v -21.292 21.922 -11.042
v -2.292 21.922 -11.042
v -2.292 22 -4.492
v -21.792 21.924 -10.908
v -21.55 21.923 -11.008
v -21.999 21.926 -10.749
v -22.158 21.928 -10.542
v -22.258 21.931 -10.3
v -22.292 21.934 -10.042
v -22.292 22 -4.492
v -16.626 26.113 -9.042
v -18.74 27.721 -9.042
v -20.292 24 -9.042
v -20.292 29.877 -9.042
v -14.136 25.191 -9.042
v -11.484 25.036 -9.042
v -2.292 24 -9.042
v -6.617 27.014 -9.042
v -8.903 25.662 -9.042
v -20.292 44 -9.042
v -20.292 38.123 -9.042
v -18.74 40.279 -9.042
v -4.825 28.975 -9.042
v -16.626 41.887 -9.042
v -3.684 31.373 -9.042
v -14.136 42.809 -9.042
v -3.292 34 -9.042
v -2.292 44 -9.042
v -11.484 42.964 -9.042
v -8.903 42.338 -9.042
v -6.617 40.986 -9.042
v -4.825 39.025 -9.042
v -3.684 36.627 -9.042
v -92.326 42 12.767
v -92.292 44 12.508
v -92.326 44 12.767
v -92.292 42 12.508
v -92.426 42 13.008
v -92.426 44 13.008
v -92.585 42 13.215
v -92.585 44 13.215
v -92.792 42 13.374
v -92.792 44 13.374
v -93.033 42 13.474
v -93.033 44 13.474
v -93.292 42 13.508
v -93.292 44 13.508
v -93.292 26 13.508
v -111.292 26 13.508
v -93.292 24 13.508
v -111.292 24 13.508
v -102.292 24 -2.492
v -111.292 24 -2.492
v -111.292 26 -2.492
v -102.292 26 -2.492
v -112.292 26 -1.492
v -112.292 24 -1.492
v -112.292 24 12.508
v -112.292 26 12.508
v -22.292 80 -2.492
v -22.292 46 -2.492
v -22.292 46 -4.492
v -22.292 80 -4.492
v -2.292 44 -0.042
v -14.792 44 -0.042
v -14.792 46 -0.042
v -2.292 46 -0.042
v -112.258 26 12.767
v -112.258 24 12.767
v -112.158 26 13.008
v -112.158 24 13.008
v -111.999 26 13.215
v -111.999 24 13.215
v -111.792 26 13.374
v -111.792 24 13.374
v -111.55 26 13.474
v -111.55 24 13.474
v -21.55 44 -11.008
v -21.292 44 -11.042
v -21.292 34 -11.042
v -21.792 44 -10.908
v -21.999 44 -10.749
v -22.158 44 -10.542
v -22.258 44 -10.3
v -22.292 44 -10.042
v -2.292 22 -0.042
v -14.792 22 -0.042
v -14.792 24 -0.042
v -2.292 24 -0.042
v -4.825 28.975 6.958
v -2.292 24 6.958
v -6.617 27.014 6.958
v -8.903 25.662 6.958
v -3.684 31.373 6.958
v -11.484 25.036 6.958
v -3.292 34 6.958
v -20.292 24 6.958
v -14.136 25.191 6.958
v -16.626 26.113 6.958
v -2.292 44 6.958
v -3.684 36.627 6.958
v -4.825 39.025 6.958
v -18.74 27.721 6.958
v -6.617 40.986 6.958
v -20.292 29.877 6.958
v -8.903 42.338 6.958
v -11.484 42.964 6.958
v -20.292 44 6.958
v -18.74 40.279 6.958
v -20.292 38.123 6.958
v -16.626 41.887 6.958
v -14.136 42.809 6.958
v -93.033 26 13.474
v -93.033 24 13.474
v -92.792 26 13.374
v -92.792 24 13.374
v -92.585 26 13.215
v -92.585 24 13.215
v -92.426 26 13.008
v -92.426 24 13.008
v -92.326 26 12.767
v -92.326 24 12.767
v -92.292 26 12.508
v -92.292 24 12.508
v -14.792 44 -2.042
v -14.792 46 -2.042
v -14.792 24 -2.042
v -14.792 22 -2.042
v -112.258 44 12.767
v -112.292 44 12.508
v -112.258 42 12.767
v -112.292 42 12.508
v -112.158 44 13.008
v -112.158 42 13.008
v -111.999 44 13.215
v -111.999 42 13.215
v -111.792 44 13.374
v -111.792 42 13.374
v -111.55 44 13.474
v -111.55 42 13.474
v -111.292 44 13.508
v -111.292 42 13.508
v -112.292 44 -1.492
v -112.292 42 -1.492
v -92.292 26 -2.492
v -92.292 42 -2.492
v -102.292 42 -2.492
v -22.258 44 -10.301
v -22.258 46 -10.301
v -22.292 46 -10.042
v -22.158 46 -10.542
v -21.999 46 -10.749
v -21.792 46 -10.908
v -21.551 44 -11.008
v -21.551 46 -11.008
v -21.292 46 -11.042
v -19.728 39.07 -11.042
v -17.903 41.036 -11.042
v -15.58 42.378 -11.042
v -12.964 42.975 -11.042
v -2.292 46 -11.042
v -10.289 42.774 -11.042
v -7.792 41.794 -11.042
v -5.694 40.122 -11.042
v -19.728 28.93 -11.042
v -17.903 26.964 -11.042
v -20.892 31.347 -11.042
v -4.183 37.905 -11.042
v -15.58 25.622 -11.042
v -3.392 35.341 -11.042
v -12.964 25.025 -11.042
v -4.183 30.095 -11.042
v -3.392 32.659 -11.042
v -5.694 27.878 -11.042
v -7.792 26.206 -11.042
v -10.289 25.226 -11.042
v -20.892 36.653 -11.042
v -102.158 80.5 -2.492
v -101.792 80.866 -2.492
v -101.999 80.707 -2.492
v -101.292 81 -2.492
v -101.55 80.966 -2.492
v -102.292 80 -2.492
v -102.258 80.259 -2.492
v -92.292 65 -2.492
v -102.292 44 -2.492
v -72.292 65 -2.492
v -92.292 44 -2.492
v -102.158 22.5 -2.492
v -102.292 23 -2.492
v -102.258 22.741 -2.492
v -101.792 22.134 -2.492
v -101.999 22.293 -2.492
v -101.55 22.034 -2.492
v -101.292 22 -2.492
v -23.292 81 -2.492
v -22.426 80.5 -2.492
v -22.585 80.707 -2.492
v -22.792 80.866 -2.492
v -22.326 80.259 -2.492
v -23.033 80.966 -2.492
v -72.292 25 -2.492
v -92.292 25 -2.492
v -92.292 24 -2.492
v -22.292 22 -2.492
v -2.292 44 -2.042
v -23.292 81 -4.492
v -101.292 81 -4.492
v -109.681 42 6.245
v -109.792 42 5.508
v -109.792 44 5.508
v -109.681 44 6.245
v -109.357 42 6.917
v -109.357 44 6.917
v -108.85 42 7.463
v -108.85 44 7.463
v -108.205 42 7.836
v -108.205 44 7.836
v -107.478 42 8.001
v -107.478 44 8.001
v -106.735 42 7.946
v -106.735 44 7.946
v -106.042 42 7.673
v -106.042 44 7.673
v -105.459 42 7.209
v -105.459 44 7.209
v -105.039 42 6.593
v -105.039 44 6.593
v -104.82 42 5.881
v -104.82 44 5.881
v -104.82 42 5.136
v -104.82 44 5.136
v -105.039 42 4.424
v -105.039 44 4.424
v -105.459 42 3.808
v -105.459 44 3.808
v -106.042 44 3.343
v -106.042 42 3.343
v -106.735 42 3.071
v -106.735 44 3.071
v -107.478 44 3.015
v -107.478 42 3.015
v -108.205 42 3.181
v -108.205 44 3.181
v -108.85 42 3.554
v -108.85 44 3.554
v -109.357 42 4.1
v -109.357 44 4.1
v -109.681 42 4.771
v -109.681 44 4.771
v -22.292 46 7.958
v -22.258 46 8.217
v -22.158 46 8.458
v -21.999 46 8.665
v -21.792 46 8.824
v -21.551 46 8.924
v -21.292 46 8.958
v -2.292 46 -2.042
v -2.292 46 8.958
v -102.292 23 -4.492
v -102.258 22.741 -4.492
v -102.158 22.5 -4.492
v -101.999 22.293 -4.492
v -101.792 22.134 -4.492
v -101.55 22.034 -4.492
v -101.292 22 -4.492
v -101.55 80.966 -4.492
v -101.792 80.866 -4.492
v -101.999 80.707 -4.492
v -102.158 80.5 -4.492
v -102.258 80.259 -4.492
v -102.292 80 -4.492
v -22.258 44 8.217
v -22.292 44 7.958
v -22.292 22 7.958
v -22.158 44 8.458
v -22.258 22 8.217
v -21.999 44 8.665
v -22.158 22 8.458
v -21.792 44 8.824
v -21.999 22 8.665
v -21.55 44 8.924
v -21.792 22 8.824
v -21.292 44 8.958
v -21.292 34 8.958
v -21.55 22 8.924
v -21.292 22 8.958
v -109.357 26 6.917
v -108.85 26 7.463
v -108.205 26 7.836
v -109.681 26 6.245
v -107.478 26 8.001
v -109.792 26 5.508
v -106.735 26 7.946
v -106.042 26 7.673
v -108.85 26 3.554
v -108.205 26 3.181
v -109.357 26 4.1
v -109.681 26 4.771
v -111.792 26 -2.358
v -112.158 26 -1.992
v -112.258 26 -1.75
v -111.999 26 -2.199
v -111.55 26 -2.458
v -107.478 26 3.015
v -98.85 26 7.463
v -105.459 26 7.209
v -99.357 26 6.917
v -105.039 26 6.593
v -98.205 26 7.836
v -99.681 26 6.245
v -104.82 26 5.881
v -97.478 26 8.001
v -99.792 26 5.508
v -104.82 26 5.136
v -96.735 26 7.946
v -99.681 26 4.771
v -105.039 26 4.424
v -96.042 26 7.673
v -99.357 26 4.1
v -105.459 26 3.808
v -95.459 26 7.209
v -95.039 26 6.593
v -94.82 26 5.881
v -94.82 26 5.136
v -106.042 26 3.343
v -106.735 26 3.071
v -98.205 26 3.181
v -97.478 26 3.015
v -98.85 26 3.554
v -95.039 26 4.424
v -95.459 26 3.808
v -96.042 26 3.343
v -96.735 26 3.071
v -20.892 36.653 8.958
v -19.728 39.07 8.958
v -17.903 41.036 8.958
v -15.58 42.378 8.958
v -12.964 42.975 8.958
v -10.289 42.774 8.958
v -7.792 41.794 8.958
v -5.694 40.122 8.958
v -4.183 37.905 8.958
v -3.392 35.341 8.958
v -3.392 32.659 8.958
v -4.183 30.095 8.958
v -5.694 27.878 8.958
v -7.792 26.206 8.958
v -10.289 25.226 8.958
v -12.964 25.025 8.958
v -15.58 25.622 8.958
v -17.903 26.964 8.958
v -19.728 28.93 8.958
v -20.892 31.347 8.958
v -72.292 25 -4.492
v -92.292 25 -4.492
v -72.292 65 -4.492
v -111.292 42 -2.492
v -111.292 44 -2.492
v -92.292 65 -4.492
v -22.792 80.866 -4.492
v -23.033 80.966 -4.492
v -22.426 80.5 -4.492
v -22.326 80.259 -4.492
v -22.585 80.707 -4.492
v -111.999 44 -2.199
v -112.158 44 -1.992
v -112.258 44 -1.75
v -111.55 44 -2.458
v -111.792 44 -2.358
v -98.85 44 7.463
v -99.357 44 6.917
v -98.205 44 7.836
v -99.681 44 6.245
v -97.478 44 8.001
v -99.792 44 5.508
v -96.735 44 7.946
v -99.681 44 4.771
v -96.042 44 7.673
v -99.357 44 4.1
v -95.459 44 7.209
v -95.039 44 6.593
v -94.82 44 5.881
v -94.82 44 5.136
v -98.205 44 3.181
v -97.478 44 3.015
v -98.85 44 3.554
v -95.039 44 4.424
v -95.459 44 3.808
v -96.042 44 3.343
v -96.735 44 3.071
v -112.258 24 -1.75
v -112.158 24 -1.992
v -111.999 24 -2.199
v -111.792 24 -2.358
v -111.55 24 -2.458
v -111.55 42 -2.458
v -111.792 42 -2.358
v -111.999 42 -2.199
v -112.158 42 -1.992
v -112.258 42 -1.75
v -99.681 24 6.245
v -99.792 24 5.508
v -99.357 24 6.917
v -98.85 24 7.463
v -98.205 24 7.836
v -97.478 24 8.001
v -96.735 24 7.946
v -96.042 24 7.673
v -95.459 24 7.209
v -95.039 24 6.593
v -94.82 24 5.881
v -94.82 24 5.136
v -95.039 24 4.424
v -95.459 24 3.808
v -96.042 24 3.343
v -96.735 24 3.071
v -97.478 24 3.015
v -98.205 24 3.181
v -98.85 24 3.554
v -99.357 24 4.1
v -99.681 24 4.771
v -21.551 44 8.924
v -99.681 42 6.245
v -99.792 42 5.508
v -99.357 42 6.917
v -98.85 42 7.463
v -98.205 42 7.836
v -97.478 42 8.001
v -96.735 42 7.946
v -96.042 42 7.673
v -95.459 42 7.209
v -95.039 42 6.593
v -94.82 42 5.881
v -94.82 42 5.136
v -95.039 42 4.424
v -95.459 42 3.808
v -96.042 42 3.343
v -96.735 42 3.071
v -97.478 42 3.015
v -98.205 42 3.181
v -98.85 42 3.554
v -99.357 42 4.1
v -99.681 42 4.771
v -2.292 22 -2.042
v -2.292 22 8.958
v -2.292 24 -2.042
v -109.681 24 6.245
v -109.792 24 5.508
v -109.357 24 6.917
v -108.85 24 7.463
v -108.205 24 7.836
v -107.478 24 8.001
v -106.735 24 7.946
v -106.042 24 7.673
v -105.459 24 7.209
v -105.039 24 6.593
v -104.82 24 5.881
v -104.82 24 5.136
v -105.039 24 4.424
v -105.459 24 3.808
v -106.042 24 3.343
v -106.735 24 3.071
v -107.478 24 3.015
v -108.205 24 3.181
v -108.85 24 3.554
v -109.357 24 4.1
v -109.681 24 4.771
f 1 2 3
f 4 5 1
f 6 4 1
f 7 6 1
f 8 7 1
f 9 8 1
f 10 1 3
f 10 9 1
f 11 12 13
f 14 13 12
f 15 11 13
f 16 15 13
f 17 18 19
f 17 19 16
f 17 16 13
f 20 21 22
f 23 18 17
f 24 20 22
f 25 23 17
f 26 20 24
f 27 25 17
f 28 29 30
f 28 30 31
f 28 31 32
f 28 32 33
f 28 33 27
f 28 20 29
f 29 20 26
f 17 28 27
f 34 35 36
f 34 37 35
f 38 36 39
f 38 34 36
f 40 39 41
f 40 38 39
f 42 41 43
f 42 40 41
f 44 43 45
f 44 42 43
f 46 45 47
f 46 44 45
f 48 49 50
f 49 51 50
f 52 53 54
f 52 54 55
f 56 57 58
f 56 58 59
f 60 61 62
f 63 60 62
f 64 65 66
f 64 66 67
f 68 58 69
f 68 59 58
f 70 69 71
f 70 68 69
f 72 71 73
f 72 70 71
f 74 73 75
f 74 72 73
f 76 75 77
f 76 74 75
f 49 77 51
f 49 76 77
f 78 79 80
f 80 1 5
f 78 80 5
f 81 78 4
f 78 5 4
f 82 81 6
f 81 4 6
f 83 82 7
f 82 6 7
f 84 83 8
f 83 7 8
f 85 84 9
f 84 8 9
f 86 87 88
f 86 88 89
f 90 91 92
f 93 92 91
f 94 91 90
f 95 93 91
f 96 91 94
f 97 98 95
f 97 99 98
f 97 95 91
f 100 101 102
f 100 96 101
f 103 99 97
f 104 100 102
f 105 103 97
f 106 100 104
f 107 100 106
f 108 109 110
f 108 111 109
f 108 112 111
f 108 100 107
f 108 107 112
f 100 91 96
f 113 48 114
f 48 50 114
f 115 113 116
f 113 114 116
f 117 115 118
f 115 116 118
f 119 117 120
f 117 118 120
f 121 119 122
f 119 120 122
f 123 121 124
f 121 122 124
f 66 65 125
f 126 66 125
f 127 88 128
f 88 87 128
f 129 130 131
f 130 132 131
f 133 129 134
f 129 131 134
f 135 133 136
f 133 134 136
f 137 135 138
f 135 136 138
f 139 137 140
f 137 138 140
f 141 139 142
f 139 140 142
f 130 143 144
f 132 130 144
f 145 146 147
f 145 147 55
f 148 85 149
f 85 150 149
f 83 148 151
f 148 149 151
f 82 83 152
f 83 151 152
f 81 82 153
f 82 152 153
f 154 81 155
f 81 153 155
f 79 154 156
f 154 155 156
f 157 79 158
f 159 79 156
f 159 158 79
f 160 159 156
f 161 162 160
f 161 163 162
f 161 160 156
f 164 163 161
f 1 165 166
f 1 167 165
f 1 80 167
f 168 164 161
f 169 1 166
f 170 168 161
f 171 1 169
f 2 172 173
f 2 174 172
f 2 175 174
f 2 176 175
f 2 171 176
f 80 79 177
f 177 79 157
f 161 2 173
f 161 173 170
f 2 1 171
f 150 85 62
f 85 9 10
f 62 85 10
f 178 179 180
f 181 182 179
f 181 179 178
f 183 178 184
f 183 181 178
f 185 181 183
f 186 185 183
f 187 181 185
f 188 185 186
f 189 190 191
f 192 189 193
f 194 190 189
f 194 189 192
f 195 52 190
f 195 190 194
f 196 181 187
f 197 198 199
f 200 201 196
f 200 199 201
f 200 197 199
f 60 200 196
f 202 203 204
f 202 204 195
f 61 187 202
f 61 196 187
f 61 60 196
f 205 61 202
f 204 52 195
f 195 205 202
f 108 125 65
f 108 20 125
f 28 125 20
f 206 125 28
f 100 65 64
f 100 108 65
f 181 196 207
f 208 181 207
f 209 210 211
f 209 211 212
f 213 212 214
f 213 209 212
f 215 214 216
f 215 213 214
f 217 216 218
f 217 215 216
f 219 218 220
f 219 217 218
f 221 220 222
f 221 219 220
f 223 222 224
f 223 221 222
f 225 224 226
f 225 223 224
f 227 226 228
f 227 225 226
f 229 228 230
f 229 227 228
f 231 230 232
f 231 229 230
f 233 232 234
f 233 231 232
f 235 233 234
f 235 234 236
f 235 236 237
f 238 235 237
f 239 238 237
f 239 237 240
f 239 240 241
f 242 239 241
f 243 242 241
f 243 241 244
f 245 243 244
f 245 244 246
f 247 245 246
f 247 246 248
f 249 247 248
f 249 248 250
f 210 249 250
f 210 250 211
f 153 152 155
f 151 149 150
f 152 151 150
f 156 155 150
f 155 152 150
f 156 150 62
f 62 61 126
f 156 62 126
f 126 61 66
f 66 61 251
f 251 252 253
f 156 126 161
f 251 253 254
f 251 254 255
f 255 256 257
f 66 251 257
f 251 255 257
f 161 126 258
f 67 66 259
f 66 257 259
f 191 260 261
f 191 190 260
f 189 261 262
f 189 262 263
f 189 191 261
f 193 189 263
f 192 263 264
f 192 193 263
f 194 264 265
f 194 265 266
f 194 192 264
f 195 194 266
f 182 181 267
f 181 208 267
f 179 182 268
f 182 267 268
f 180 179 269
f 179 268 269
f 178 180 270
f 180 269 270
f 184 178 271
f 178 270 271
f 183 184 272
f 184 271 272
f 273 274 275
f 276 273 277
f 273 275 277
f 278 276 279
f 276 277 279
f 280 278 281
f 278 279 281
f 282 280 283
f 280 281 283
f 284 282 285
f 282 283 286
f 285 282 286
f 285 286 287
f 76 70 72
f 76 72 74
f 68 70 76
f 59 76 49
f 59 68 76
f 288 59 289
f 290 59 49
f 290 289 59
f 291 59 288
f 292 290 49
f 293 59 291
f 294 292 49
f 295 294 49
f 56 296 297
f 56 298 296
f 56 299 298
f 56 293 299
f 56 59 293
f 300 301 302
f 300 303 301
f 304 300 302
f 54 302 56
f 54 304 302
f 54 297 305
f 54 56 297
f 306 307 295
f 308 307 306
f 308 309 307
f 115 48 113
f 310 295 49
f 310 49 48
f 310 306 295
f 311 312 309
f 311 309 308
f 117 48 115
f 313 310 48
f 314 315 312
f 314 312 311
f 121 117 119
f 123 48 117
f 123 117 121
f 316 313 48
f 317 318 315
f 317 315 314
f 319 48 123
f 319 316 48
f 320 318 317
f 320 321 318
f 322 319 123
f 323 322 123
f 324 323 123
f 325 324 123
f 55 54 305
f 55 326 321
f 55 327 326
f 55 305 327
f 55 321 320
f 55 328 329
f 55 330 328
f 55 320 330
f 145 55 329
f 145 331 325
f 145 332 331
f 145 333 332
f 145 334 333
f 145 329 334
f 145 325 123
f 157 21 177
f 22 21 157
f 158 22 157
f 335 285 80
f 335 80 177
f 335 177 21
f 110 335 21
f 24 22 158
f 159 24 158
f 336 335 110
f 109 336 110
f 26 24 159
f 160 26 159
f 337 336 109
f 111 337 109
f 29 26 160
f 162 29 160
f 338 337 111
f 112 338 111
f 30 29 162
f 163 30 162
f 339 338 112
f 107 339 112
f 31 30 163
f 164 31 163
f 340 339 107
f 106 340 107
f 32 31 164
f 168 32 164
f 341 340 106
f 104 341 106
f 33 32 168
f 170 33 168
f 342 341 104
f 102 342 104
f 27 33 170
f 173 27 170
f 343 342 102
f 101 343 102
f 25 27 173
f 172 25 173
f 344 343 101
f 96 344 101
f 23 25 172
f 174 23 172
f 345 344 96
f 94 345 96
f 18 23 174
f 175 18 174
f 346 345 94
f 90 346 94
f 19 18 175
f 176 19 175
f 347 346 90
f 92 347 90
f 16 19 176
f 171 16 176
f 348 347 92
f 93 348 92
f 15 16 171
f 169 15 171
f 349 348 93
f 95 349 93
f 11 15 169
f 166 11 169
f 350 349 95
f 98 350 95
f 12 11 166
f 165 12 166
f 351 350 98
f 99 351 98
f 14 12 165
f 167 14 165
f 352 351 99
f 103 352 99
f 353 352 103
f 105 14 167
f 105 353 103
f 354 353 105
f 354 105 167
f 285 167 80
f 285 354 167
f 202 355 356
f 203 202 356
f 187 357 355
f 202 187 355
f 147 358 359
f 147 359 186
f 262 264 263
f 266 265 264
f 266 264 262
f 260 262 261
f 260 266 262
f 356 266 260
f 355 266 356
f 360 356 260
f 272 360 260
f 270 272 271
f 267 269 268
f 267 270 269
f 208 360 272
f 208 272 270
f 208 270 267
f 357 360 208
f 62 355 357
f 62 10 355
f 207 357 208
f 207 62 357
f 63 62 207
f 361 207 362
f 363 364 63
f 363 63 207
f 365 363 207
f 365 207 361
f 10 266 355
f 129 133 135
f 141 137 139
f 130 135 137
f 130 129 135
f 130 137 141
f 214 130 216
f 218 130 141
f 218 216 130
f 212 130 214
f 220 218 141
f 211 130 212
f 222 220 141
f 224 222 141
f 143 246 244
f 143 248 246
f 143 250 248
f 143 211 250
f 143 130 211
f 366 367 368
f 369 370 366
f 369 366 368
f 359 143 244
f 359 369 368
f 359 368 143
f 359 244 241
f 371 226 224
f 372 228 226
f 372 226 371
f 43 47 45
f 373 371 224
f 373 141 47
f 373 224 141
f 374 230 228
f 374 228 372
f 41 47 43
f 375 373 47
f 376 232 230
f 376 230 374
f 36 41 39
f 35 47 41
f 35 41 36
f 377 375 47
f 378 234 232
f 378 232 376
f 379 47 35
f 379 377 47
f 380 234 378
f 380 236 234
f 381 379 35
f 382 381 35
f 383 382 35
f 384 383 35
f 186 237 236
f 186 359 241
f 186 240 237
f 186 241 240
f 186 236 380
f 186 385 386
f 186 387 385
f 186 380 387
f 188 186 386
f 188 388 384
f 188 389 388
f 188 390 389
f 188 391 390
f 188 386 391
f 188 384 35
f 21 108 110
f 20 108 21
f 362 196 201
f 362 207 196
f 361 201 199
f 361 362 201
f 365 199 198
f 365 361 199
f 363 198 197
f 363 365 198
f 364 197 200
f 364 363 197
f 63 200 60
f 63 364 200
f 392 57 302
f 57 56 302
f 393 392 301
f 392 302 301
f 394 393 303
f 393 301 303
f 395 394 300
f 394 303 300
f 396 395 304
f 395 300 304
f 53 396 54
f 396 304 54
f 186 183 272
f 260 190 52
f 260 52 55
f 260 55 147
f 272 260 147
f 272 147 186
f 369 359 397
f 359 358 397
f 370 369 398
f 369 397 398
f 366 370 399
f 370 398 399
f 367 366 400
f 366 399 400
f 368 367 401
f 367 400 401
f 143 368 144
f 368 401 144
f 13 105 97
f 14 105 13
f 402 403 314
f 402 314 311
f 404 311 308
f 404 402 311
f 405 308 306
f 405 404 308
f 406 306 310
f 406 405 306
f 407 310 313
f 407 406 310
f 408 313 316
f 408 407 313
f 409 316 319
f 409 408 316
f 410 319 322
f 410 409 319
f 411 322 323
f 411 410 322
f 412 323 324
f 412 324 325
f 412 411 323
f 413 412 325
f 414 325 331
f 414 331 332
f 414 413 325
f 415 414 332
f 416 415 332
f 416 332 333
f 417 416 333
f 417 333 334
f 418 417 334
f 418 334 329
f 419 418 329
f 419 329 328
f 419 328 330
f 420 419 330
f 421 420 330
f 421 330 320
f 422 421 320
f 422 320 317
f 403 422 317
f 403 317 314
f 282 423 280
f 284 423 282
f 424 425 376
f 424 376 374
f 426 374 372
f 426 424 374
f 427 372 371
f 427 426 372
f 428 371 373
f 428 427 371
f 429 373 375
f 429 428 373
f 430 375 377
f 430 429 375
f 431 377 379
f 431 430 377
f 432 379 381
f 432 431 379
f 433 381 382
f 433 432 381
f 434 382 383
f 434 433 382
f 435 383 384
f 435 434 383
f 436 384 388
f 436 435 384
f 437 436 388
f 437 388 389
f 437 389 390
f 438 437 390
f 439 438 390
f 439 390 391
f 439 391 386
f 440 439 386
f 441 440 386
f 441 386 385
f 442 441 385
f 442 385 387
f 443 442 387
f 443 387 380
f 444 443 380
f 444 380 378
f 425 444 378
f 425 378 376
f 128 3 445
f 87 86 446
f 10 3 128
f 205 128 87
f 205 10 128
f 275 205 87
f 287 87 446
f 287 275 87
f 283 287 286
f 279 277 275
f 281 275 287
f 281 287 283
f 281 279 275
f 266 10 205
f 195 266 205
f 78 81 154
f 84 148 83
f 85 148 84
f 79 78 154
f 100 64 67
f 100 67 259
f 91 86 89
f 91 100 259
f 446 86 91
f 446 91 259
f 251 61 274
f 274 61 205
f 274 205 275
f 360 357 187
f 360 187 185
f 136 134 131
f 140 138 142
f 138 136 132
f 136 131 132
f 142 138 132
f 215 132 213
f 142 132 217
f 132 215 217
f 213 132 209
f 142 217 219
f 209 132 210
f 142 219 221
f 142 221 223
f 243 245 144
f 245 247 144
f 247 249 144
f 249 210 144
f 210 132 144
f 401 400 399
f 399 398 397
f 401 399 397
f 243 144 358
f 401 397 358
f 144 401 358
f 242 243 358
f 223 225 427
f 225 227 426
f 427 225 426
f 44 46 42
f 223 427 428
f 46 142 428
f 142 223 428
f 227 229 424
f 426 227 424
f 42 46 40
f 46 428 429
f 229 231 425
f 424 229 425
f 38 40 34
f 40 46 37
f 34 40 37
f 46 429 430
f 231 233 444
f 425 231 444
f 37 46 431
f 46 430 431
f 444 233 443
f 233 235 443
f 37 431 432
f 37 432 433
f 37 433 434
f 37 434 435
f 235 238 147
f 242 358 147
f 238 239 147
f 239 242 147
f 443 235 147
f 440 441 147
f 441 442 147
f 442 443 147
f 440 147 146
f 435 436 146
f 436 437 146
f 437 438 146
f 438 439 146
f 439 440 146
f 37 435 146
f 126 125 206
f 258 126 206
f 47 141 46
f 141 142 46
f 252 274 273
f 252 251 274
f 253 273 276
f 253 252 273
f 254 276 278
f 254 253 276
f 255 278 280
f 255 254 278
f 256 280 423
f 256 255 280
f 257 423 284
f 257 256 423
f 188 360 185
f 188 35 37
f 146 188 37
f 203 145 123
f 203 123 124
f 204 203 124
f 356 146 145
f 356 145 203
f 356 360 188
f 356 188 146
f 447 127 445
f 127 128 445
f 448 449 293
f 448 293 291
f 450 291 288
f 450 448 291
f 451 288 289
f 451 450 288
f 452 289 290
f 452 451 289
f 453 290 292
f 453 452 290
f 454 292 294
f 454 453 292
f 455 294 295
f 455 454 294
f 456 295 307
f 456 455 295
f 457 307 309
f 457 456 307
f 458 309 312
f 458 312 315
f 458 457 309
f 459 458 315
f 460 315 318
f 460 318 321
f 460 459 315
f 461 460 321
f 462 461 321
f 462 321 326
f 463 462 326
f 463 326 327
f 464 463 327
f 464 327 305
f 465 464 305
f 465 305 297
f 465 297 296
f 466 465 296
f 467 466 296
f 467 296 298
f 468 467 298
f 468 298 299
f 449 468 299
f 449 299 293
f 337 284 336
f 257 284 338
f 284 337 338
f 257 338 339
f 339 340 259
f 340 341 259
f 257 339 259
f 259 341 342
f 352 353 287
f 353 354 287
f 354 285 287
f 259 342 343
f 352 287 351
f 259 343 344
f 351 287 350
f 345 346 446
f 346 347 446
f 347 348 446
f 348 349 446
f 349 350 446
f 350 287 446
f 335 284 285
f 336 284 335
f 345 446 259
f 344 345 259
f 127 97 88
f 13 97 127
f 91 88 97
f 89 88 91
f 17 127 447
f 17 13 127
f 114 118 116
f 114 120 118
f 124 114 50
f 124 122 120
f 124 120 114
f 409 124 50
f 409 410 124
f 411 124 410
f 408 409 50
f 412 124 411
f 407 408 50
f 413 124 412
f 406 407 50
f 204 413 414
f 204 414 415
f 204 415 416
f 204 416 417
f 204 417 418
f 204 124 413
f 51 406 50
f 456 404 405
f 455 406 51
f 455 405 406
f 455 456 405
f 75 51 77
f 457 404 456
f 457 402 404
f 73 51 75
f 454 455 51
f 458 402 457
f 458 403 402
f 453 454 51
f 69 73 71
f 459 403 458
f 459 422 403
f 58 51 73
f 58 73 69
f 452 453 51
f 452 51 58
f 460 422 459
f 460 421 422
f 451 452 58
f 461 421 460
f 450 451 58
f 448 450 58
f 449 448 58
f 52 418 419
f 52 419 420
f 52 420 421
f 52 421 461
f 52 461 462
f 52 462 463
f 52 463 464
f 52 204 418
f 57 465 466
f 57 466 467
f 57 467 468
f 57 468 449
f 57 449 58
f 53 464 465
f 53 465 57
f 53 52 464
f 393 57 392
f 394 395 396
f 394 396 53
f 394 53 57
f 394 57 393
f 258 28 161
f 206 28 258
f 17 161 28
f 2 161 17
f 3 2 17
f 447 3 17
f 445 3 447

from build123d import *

# Parameters (mm, degrees)
BOSS_EXTRUDE1_DEPTH = 20
FILLET1_R           = 1
SKETCH2_R           = 9
CUT_EXTRUDE1_DEPTH  = 20
BOSS_EXTRUDE2_START = 2
BOSS_EXTRUDE2_DEPTH = 2
SKETCH4_W           = 20
SKETCH4_H           = 20
BOSS_EXTRUDE3_DEPTH = 2
FILLET2_R           = 1
SKETCH5_W           = 12.5
SKETCH5_H           = 2
CUT_EXTRUDE2_DEPTH  = 24
BOSS_EXTRUDE4_DEPTH = 80
FILLET3_R           = 1
SKETCH8_R           = 7.11392485
SKETCH8_W           = 20
SKETCH8_H           = 40
CUT_EXTRUDE3_DEPTH  = 2
SKETCH9_W           = 20
SKETCH9_H           = 2
BOSS_EXTRUDE5_DEPTH = 16
FILLET4_R           = 1
SKETCH10_R          = 2.5
CUT_EXTRUDE4_DEPTH  = 20
CUT_EXTRUDE5_DEPTH  = 1000
SKETCH16_W          = 44.924413541
SKETCH16_H          = 28.761805837
CUT_EXTRUDE6_DEPTH  = 200


with BuildPart() as part:
    # Sketch1 → Boss-Extrude1 (new body)
    with BuildSketch(Plane(origin=(0, 0, 0), x_dir=(1, 0, 0), z_dir=(0, 1, 0))):
        Polygon((-2.291666667, 11.041666667), (-22.291666667, 11.041666667), (-22.291666667, -8.958333333), (-2.291666667, -8.958333333), (-2.291666667, -6.958333333), (-20.291666667, -6.958333333), (-20.291666667, 9.041666667), (-2.291666667, 9.041666667), align=None)
    extrude(amount=BOSS_EXTRUDE1_DEPTH)

    # Fillet1
    fillet1_edges = [part.edges().sort_by_distance(p)[0] for p in [
        (-22.291666667, 10, 8.958333333),
        (-22.291666667, 10, -11.041666667),
    ]]
    fillet(fillet1_edges, radius=FILLET1_R)

    # Sketch2 → Cut-Extrude1 (cut)
    with BuildSketch(Plane.XY.offset(8.958333333)):
        with Locations(Location((-12.291666667, 10, 0), (0, 0, 180))):
            Circle(SKETCH2_R)
    extrude(amount=-CUT_EXTRUDE1_DEPTH, mode=Mode.SUBTRACT)

    # Sketch3 → Boss-Extrude2 (add)
    with BuildSketch(Plane(origin=(0, 20, 0), x_dir=(1, 0, 0), z_dir=(0, 1, 0)).offset(BOSS_EXTRUDE2_START)):
        Polygon((-2.291666667, 2.377848536), (-2.291666667, 9.041666667), (-20.291666667, 9.041666667), (-20.291666667, -6.958333333), (-2.291666667, -6.958333333), (-2.291666667, 0.377848536), align=None)
        with BuildLine():
            Line((-2.291666667, 9.041666667), (-2.291666667, 11.041666667))
            Line((-2.291666667, 11.041666667), (-21.291666667, 11.041666667))
            ThreePointArc((-21.291666667, 11.041666667), (-21.998773448, 10.748773448), (-22.291666667, 10.041666667))
            Line((-22.291666667, 10.041666667), (-22.291666667, -7.958333333))
            ThreePointArc((-22.291666667, -7.958333333), (-21.998773448, -8.665440115), (-21.291666667, -8.958333333))
            Line((-21.291666667, -8.958333333), (-2.291666667, -8.958333333))
            Line((-2.291666667, -8.958333333), (-2.291666667, -6.958333333))
            Line((-2.291666667, -6.958333333), (-20.291666667, -6.958333333))
            Line((-20.291666667, -6.958333333), (-20.291666667, 9.041666667))
            Line((-20.291666667, 9.041666667), (-2.291666667, 9.041666667))
        make_face()
    extrude(amount=-BOSS_EXTRUDE2_DEPTH)

    # Sketch4 → Boss-Extrude3 (add)
    with BuildSketch(Plane.XZ):
        with Locations((-12.291666667, -1.041666667)):
            Rectangle(SKETCH4_W, SKETCH4_H)
    extrude(amount=BOSS_EXTRUDE3_DEPTH)

    # Fillet2
    fillet2_edges = [part.edges().sort_by_distance(p)[0] for p in [
        (-22.291666667, -1, -11.041666667),
        (-22.291666667, -1, 8.958333333),
    ]]
    fillet(fillet2_edges, radius=FILLET2_R - 0.0001)  # a hair under: the kernel refuses the full size

    # Sketch5 → Cut-Extrude2 (cut)
    with BuildSketch(Plane(origin=(0, 22, 0), x_dir=(1, 0, 0), z_dir=(0, 1, 0))):
        with Locations((-8.541666667, 1.041666667)):
            Rectangle(SKETCH5_W, SKETCH5_H)
    extrude(amount=-CUT_EXTRUDE2_DEPTH, mode=Mode.SUBTRACT)

    # Sketch6 → Boss-Extrude4 (add)
    with BuildSketch(Plane.ZY.offset(22.291666667)):
        Polygon((-2.491666667, -37), (-4.491666667, -37), (-4.491666667, -2), (-4.491666667, 22), (-2.491666667, 22), (-2.491666667, -2), align=None)
    extrude(amount=BOSS_EXTRUDE4_DEPTH)

    # Fillet3
    fillet3_edges = [part.edges().sort_by_distance(p)[0] for p in [
        (-22.291666667, -37, -3.491666667),
        (-102.291666667, 22, -3.491666667),
        (-102.291666667, -37, -3.491666667),
    ]]
    fillet(fillet3_edges, radius=FILLET3_R)

    # Sketch8 → Cut-Extrude3 (cut)
    with BuildSketch(Plane(origin=(0, 0, -4.491666667), x_dir=(-1, 0, 0), z_dir=(0, 0, -1))):
        with Locations((12.291666667, 10)):
            Circle(SKETCH8_R)
        with Locations((82.291666667, -1)):
            Rectangle(SKETCH8_W, SKETCH8_H)
    extrude(amount=-CUT_EXTRUDE3_DEPTH, mode=Mode.SUBTRACT)

    # Sketch9 → Boss-Extrude5 (add)
    with BuildSketch(Plane.XY.offset(-2.491666667)):
        Polygon((-92.823958121, 20), (-112.291666667, 20), (-112.291666667, 18), (-92.291666667, 18), (-92.291666667, 20), align=None)
        with Locations((-102.291666667, 1)):
            Rectangle(SKETCH9_W, SKETCH9_H)
    extrude(amount=BOSS_EXTRUDE5_DEPTH)

    # Fillet4
    fillet4_edges = [part.edges().sort_by_distance(p)[0] for p in [
        (-112.291666667, 19, -2.491666667),
        (-112.291666667, 19, 13.508333333),
        (-92.291666667, 19, 13.508333333),
        (-112.291666667, 1, -2.491666667),
        (-92.291666667, 1, 13.508333333),
        (-112.291666667, 1, 13.508333333),
    ]]
    fillet(fillet4_edges, radius=FILLET4_R)

    # Sketch10 → Cut-Extrude4 (cut)
    with BuildSketch(Plane(origin=(0, 20, 0), x_dir=(1, 0, 0), z_dir=(0, 1, 0))):
        with Locations(Location((-97.291666667, -5.508333333, 0), (0, 0, 180))):
            Circle(SKETCH10_R)
        with Locations(Location((-107.291666667, -5.508333333, 0), (0, 0, 180))):
            Circle(SKETCH10_R)
    extrude(amount=-CUT_EXTRUDE4_DEPTH, mode=Mode.SUBTRACT)

    # Mirror18: part across plane


with BuildPart() as part_1:
    add(part.part)
    add(part.part.mirror(Plane.ZX.offset(22)))

    # Sketch15 → Cut-Extrude5 (cut)
    with BuildSketch(Plane.ZY.offset(102.291666667)):
        Polygon((-4.491666667, 22), (26.371176894, 22), (26.371176894, -60.225143759), (-46.701352218, -60.225143759), (-46.701352218, 21.5), align=None)
    extrude(amount=-CUT_EXTRUDE5_DEPTH, mode=Mode.SUBTRACT)


with BuildPart() as cut_extrude5_piece_1:
    # of the separate pieces the step leaves, piece 1, a body of its own (cut_extrude5_pieces)
    add(part_1.part.solids().sort_by_distance((-101.291666667, 22, -2.491666667))[0])


with BuildPart() as cut_extrude5_piece_2:
    # of the separate pieces the step leaves, piece 2, a body of its own (cut_extrude5_pieces)
    add(part_1.part.solids().sort_by_distance((-112.291666667, 20, -1.491666667))[0])


with BuildPart() as cut_extrude5_piece_3:
    # of the separate pieces the step leaves, piece 3, a body of its own (cut_extrude5_pieces)
    add(part_1.part.solids().sort_by_distance((-111.291666667, 2, -2.491666667))[0])


with BuildPart() as cut_extrude6_tool:
    # Sketch16 → Cut-Extrude6 (new body)
    with BuildSketch(Plane(origin=(-102.291666667, 0, 0), x_dir=(0, 0, -1), z_dir=(1, 0, 0))):
        with Locations((-5.305801417, 7.602093766)):
            Rectangle(SKETCH16_W, SKETCH16_H)
    extrude(amount=-CUT_EXTRUDE6_DEPTH)


with BuildPart() as cut_extrude5_piece_2_1:
    add(cut_extrude5_piece_2.part)

    # Cut-Extrude6: cut by cut_extrude6_tool
    add(cut_extrude6_tool.part, mode=Mode.SUBTRACT)


with BuildPart() as cut_extrude5_piece_3_1:
    add(cut_extrude5_piece_3.part)

    # Cut-Extrude6: cut by cut_extrude6_tool
    add(cut_extrude6_tool.part, mode=Mode.SUBTRACT)


solid = cut_extrude5_piece_1.part
